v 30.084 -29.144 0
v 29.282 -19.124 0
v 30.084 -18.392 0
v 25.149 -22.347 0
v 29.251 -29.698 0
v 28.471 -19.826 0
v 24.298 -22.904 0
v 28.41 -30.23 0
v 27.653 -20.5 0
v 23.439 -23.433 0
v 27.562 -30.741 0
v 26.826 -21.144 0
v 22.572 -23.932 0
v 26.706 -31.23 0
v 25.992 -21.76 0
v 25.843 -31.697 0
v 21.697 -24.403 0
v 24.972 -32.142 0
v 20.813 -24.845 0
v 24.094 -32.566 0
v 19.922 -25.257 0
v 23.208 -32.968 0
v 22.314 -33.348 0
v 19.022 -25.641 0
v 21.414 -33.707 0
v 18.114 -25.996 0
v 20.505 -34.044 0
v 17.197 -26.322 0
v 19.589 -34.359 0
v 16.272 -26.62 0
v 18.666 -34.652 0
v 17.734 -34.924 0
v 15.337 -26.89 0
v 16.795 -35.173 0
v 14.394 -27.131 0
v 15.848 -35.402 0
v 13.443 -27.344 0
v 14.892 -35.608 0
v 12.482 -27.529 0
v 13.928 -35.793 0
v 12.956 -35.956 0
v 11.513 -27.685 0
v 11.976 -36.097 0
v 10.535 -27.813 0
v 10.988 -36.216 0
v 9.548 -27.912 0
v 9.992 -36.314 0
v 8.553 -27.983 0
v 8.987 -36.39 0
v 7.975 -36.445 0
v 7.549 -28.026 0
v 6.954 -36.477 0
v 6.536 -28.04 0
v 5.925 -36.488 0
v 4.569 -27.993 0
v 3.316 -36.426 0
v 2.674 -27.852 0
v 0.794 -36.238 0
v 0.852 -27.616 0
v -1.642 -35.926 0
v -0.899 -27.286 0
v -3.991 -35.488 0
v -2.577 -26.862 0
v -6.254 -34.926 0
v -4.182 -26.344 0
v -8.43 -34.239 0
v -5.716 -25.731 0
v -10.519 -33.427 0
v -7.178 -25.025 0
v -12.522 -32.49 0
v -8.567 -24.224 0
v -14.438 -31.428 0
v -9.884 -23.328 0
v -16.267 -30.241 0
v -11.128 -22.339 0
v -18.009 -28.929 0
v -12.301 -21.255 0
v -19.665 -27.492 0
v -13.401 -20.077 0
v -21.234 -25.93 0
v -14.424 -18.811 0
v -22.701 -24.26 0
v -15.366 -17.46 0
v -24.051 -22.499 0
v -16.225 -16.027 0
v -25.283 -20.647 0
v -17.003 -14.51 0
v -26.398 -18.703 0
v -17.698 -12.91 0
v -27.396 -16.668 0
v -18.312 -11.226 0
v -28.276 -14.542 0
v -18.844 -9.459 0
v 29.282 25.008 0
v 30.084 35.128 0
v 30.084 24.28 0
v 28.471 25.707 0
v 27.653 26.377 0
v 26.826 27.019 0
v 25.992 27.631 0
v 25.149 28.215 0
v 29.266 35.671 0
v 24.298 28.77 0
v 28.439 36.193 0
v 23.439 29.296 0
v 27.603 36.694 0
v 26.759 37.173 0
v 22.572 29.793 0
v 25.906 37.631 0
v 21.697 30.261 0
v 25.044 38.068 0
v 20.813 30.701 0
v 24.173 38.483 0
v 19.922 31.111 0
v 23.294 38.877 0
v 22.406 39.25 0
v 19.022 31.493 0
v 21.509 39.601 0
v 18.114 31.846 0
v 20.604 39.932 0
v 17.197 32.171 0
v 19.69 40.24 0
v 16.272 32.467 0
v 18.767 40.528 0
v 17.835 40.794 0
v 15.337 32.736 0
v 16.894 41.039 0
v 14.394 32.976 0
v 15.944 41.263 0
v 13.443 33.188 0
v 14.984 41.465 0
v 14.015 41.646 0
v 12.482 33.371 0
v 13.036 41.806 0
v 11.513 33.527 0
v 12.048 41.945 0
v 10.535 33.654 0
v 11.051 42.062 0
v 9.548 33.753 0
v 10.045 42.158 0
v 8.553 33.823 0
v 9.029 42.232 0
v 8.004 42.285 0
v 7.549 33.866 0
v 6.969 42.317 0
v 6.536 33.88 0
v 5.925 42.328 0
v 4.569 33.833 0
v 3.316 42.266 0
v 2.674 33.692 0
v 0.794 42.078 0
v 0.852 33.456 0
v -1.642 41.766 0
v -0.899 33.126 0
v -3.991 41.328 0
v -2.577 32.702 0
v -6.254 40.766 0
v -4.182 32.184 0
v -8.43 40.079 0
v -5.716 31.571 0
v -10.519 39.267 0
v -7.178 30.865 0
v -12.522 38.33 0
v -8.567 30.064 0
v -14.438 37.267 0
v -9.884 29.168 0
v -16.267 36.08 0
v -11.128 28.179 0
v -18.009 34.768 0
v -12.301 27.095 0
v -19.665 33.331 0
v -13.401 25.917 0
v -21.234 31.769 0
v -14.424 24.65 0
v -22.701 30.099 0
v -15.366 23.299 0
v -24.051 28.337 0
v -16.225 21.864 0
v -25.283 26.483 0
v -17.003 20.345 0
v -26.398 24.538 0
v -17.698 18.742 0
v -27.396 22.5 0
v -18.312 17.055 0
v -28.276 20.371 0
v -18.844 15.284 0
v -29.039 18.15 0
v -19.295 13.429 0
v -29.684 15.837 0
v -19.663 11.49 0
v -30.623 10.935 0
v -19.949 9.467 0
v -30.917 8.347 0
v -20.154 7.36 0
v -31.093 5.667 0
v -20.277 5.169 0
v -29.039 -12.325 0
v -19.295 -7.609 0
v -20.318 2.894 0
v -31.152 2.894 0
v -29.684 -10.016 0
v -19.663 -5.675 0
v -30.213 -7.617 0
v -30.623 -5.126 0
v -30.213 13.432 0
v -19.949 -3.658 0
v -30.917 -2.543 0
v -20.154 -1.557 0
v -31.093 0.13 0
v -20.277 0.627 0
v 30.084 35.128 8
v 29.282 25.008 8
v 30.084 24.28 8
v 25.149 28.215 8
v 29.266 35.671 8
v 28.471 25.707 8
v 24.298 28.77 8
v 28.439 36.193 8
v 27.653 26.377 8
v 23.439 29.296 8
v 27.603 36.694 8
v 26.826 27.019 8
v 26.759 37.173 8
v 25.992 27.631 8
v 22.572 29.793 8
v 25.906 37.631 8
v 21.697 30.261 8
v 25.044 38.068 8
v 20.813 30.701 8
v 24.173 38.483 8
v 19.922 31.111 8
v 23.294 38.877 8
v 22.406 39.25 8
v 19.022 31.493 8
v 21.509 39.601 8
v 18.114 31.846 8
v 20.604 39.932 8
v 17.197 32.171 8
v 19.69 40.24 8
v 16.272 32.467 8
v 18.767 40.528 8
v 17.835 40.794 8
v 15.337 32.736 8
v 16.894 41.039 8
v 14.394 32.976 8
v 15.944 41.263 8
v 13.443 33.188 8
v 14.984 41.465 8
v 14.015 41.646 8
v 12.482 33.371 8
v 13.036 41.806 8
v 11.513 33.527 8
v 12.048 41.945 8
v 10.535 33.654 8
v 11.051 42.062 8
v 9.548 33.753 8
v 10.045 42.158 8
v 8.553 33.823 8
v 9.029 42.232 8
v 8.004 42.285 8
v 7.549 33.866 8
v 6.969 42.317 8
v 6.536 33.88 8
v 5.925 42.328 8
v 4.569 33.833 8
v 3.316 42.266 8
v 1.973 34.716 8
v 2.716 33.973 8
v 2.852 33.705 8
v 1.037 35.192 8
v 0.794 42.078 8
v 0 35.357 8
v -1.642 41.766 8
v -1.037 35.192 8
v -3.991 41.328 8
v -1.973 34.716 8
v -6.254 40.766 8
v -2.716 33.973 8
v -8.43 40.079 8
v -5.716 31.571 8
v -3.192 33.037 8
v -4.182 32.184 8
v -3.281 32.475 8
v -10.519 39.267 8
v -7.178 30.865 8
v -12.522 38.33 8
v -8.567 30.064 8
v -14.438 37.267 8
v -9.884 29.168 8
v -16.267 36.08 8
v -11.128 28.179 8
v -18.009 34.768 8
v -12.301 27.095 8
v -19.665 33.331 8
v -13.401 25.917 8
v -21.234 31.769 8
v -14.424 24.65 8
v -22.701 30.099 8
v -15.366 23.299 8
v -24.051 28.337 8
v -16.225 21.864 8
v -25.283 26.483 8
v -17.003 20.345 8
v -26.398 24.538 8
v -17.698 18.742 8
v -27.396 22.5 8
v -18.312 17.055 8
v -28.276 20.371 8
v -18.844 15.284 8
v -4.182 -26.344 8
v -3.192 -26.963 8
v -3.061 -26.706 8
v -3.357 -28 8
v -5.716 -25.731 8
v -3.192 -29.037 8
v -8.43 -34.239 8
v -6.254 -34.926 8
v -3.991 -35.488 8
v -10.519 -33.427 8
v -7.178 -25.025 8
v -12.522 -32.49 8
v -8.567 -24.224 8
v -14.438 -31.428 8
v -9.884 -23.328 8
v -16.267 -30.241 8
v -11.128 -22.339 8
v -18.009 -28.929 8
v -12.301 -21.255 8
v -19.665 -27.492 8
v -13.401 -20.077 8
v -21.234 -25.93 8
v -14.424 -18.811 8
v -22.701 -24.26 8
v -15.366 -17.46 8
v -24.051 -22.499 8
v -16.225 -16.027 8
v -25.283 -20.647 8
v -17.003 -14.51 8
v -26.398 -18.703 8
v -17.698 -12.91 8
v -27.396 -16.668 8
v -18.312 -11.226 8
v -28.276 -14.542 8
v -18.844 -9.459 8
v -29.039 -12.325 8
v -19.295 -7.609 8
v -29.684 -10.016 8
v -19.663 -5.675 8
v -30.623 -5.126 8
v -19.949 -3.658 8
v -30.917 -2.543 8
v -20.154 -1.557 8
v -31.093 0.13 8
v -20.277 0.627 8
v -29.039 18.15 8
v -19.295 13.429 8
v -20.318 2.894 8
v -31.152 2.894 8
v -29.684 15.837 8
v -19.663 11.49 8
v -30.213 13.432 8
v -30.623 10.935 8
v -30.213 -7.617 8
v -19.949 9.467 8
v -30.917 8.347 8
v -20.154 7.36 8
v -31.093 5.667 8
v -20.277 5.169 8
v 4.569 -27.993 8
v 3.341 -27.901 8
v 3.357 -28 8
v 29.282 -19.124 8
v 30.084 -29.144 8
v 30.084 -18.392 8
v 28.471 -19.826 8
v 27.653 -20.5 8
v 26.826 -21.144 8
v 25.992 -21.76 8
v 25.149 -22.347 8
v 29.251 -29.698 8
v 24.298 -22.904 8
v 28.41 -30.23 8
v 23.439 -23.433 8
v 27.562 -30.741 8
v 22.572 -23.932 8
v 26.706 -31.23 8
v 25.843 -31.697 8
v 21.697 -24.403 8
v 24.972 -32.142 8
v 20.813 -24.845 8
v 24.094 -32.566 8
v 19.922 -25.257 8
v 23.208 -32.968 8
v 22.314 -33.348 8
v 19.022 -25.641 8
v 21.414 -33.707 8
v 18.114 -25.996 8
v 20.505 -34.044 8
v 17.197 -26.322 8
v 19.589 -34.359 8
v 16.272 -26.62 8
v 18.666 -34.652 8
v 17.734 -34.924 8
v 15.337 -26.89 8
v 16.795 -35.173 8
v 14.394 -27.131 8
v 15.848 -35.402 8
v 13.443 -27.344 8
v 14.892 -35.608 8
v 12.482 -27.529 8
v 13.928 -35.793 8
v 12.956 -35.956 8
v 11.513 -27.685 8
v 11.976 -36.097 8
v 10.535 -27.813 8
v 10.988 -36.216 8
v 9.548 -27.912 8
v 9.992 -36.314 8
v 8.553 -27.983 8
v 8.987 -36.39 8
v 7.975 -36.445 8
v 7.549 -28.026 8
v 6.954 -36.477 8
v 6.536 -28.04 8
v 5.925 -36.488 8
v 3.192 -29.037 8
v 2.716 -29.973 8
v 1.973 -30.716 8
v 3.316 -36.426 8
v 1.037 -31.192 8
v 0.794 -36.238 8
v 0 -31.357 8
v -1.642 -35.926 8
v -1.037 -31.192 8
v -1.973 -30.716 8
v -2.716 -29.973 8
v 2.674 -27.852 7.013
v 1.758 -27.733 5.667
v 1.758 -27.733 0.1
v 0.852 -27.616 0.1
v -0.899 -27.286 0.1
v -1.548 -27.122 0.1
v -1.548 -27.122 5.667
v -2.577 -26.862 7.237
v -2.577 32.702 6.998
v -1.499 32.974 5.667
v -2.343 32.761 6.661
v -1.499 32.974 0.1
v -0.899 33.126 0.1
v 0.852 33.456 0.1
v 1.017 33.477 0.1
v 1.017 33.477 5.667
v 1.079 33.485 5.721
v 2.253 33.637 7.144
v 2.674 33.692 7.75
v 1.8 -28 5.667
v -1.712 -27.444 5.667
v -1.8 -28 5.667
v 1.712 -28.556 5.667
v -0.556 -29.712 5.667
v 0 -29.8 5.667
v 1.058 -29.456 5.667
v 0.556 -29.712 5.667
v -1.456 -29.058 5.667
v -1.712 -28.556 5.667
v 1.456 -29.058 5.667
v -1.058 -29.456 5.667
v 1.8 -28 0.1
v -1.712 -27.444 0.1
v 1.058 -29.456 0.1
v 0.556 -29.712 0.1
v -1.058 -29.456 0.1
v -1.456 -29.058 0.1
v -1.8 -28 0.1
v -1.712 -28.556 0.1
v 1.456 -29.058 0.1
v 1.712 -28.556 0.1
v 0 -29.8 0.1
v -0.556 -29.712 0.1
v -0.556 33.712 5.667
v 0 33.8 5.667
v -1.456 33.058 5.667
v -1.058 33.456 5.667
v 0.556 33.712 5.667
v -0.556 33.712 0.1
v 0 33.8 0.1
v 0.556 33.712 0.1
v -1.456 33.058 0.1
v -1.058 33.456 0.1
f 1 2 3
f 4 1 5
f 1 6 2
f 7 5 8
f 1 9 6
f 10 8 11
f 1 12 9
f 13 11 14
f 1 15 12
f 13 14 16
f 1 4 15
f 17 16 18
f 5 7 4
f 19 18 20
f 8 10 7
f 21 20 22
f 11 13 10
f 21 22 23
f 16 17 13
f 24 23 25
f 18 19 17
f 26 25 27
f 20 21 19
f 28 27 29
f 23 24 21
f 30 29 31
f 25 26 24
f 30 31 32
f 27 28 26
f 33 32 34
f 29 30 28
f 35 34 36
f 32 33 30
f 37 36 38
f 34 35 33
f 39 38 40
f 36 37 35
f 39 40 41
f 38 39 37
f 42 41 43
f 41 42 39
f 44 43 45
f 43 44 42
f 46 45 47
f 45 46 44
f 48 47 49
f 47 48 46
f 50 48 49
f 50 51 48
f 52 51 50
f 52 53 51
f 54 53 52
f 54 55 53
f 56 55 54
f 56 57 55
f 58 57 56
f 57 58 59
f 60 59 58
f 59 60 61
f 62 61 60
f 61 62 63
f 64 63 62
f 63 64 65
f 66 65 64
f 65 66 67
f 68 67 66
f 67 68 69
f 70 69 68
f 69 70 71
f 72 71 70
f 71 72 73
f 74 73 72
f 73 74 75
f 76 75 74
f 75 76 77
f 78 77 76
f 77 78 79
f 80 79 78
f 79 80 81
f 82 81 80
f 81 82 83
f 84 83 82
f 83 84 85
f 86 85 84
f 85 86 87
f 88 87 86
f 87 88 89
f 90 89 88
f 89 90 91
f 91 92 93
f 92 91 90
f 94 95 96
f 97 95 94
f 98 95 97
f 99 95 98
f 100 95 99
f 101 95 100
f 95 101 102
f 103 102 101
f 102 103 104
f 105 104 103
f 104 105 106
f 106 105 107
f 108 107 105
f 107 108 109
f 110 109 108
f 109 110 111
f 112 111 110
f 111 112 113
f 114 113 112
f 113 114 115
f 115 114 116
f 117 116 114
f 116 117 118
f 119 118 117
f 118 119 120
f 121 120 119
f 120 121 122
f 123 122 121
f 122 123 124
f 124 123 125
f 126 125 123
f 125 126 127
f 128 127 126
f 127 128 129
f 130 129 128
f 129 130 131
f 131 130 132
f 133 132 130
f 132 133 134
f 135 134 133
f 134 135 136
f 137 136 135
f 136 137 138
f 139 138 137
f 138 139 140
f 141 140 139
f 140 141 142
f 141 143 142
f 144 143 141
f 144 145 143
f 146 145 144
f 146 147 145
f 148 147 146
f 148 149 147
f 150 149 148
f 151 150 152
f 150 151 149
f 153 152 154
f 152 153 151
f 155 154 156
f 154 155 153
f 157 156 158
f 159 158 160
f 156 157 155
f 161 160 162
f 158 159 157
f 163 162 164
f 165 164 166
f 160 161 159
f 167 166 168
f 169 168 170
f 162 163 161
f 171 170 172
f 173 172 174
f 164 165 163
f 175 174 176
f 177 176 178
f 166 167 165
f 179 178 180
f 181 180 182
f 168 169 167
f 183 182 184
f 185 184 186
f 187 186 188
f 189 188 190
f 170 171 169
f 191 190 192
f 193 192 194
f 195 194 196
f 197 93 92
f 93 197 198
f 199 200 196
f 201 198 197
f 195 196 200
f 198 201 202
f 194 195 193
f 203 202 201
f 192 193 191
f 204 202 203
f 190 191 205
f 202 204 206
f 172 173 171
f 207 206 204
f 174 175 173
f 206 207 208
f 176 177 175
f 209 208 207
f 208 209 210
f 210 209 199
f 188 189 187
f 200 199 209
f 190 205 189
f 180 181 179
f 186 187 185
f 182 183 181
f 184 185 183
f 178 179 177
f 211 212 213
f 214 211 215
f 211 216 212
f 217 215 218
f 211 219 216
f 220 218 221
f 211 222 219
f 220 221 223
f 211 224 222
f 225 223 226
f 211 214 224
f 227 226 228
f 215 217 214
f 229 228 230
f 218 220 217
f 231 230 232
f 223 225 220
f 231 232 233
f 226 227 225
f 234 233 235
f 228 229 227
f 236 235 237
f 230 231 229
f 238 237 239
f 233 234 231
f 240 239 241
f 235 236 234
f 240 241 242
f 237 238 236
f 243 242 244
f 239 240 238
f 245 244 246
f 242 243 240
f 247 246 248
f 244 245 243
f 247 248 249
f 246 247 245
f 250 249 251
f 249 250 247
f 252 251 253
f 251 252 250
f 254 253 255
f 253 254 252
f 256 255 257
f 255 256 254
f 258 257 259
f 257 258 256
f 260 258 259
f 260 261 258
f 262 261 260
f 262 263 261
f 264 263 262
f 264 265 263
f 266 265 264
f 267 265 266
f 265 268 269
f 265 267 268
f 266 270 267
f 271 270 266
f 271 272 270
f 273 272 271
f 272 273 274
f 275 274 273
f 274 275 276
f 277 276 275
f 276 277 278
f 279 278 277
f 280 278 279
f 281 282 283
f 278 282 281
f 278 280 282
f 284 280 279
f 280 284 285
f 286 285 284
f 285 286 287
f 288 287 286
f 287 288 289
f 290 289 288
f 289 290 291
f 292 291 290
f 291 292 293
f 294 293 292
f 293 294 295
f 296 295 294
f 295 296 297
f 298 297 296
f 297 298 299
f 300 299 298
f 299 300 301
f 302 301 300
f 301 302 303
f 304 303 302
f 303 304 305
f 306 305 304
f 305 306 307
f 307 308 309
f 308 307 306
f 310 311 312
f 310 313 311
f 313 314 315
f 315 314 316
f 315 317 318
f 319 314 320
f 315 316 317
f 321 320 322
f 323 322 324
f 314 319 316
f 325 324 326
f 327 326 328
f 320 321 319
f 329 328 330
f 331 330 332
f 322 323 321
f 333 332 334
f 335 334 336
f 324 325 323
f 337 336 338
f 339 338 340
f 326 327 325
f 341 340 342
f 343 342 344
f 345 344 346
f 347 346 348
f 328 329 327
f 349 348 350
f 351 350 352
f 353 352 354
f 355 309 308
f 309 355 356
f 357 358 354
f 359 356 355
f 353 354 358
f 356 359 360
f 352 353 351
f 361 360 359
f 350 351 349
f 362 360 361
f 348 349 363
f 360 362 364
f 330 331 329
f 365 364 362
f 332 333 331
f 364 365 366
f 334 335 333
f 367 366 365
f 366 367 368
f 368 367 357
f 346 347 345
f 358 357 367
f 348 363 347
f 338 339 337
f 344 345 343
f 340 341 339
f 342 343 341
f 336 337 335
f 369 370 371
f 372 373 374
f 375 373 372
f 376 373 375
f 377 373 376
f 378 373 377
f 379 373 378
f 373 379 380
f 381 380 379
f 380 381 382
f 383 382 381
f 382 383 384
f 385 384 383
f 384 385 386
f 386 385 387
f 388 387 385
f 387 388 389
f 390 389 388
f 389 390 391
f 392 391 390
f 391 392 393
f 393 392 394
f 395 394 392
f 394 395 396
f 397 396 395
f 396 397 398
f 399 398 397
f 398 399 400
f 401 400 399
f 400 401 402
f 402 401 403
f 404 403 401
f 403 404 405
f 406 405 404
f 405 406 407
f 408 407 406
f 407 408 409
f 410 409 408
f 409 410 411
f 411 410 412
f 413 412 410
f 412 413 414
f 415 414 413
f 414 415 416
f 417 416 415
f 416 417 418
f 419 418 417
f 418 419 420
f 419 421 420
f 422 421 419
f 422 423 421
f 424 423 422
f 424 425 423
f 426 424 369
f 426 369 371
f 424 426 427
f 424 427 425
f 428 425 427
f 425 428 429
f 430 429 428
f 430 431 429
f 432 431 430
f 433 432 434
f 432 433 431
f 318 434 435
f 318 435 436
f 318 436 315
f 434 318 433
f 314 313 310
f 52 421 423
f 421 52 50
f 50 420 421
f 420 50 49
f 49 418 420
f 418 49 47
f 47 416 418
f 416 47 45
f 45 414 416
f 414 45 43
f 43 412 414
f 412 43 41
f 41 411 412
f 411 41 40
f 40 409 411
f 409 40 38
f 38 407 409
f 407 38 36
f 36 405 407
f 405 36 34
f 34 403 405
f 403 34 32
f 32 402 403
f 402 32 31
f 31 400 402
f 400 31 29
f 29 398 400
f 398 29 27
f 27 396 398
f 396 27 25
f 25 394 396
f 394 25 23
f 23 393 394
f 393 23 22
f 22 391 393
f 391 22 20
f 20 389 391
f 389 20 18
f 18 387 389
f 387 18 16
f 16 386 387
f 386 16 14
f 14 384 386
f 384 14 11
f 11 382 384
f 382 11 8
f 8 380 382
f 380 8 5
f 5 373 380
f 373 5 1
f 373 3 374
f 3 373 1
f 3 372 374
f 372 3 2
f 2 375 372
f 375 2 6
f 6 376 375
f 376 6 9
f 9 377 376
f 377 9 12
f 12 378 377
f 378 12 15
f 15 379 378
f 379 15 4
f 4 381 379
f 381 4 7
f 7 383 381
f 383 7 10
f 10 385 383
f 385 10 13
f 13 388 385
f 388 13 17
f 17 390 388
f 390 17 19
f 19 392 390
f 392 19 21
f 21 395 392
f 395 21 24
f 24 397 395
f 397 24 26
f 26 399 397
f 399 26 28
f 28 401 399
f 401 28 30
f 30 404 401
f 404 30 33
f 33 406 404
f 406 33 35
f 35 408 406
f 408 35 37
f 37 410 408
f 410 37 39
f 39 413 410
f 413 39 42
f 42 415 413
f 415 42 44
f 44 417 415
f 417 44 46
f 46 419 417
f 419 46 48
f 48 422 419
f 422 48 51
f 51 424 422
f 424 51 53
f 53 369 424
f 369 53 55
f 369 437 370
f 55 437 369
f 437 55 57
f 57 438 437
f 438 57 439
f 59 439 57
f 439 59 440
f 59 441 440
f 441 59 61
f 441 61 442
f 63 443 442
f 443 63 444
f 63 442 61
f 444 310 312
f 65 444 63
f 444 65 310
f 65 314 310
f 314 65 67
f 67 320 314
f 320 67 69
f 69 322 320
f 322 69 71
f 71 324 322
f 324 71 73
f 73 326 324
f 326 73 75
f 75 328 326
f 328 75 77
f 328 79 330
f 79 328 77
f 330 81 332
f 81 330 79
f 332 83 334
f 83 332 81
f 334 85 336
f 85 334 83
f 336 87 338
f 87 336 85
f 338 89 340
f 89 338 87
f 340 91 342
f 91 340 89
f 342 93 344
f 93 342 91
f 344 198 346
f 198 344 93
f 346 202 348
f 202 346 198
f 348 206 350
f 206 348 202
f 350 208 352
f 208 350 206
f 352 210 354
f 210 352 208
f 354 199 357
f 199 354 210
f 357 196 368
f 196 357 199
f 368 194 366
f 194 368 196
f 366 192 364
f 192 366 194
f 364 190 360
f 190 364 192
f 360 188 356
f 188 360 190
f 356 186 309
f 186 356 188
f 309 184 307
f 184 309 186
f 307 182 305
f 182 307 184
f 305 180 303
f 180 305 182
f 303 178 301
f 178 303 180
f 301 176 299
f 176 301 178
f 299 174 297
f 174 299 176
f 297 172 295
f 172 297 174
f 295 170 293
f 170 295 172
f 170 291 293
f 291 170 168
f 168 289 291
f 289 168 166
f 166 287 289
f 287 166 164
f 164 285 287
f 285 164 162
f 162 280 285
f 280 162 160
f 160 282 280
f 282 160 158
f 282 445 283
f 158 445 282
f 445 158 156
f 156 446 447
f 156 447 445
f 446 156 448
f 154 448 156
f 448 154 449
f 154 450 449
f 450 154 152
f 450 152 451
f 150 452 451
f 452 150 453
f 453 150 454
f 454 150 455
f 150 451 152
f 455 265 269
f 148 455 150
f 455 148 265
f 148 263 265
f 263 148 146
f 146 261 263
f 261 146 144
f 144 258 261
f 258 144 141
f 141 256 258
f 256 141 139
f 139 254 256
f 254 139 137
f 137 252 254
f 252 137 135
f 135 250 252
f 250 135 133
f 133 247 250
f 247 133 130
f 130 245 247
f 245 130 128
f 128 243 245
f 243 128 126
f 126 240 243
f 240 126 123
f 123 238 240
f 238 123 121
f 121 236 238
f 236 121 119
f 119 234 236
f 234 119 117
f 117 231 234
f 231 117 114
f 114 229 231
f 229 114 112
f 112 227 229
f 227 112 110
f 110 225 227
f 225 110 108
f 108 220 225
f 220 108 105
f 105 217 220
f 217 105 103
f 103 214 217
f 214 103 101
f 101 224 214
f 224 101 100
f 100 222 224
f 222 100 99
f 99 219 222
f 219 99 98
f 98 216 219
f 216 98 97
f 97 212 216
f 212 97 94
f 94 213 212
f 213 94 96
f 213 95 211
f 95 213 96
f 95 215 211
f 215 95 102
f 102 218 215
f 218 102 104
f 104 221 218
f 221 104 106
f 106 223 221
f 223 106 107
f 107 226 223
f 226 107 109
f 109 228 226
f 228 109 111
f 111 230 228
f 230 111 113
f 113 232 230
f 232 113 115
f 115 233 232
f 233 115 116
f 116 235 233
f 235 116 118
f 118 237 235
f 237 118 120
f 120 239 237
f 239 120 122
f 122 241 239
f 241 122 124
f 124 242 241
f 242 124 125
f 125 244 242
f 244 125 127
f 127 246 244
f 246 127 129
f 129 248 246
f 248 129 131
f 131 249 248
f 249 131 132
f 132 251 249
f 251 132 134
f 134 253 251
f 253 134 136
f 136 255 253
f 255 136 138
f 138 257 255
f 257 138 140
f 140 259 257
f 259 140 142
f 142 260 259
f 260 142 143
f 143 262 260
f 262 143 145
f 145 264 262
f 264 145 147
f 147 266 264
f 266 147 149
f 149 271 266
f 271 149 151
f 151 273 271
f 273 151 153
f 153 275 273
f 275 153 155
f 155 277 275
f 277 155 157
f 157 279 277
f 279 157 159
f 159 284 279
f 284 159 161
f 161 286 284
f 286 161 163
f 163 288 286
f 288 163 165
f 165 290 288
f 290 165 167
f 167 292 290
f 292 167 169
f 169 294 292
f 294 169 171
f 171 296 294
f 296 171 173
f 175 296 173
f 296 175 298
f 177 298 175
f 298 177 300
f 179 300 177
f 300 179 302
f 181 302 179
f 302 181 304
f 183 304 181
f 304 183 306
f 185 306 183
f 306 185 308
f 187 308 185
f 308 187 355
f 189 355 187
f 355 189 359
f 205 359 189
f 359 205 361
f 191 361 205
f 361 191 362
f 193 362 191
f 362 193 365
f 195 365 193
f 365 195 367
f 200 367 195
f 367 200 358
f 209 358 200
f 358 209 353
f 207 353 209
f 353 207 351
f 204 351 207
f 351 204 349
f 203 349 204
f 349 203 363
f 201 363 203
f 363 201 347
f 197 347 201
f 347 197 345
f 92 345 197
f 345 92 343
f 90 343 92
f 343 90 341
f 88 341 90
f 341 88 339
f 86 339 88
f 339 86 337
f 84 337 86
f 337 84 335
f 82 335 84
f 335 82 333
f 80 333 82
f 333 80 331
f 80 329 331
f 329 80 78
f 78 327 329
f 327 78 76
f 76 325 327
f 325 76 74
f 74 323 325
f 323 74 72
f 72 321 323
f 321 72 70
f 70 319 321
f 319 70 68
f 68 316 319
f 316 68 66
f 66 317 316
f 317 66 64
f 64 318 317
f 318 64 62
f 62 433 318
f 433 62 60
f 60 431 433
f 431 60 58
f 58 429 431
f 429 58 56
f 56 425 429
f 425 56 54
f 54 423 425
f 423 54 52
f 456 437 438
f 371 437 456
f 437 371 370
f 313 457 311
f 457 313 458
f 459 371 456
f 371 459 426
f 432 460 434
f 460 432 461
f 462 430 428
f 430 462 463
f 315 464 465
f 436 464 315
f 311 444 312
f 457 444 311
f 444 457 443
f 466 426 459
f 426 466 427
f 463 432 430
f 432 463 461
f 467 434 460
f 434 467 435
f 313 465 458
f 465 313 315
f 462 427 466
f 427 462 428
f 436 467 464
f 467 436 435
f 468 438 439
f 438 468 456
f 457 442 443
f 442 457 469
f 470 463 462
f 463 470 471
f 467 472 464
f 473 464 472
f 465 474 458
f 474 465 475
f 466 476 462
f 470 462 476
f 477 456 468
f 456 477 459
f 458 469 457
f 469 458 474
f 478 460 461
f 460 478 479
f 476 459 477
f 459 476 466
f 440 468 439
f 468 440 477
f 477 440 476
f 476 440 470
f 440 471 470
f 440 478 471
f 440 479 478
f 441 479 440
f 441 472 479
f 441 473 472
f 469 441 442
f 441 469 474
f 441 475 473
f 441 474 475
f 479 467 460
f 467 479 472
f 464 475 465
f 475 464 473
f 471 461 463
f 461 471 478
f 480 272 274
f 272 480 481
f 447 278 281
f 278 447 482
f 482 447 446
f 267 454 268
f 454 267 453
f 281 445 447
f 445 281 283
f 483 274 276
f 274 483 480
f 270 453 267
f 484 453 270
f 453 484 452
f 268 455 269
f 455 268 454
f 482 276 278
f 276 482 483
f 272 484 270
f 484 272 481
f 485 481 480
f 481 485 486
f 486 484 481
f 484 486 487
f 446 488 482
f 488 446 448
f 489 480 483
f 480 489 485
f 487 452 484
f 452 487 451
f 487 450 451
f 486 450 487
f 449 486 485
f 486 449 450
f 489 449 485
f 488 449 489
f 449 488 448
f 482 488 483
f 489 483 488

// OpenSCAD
// Street Numbers for 3D printing
// Charles Tilford, 2019
// License: CC BY-NC-SA 4.0
//   https://creativecommons.org/licenses/by-nc-sa/4.0/

char="C";     // The number/letter to print

// Units are in mm, except for height of letter

// How many inches high should letter be?
inchesHigh=3;
// How thick/deep should letter be (mm)?
depth=8;

// Character coordinates just center the letter
charX=-37;    // Character X coord
charY=-35;    // Character Y coord
topScrew=32;  // Top screw Y coord
botScrew=-28; // Bottom screw Y coord
height=8;     // Thickness of character
// Screw dimensions. Default presumes
// #6 sheet metal screw
screwWid=3.6; // Width of screw shaft
screwTop=6.78;// Width of screw head
screwCon=5.08;// Height of head 'cone'

// Font to print in. Your system needs this
// installed, of course. If changed the hole
// positions almost certainly need to be
// changed, and maybe charX/charY.
fName="Open Sans Extrabold";
// https://fonts.google.com/specimen/Open+Sans
// Designer: Steve Matteson

// Thin floor below holes. My printer was
// struggling to have the hole 'border' stick
// to the stage. Just drill/screw thru it.
holeFloor=0.1; 

// ==========================================
// ===== All values below are auto-calculated
// ==========================================

// Scaled values
scaleFactor=inchesHigh / 3;
cX=charX * scaleFactor;
cY=charY * scaleFactor;
tS=topScrew * scaleFactor;
bS=botScrew * scaleFactor;
// Where do we start drawing screw head cone?
oS=depth - (screwCon-.05);

difference() {
  // We use difference() to punch out the screw holes
  // in the character
    
  // The character itself, 8mm thick
  translate([cX,cY,0])
    linear_extrude(height=depth, scale=1)
    text(char, size=(75*scaleFactor),
         $fn=100, font=fName);
    
  // Bottom screw hole
  translate([0,bS,oS]) color("red")
    cylinder(h=screwCon, d2=screwTop,
             d1=0, $fn=20);
   translate([0,bS,holeFloor])
    cylinder(h=20, d=screwWid, $fn=20);
    
  // Top screw hole
  translate([0,tS,oS]) color("red")
    cylinder(h=screwCon, d2=screwTop,
             d1=0, $fn=20);
  translate([0,tS,holeFloor])
    cylinder(h=20, d=screwWid, $fn=20);
}

// Colors are just to aid visualization of
// void spaces. $fn is "featuer number", ie how
// many polygons are devoted to object. The values
// above should be near your printing limit anyway.

// Developed in OpenSCAD
//    https://www.openscad.org/
